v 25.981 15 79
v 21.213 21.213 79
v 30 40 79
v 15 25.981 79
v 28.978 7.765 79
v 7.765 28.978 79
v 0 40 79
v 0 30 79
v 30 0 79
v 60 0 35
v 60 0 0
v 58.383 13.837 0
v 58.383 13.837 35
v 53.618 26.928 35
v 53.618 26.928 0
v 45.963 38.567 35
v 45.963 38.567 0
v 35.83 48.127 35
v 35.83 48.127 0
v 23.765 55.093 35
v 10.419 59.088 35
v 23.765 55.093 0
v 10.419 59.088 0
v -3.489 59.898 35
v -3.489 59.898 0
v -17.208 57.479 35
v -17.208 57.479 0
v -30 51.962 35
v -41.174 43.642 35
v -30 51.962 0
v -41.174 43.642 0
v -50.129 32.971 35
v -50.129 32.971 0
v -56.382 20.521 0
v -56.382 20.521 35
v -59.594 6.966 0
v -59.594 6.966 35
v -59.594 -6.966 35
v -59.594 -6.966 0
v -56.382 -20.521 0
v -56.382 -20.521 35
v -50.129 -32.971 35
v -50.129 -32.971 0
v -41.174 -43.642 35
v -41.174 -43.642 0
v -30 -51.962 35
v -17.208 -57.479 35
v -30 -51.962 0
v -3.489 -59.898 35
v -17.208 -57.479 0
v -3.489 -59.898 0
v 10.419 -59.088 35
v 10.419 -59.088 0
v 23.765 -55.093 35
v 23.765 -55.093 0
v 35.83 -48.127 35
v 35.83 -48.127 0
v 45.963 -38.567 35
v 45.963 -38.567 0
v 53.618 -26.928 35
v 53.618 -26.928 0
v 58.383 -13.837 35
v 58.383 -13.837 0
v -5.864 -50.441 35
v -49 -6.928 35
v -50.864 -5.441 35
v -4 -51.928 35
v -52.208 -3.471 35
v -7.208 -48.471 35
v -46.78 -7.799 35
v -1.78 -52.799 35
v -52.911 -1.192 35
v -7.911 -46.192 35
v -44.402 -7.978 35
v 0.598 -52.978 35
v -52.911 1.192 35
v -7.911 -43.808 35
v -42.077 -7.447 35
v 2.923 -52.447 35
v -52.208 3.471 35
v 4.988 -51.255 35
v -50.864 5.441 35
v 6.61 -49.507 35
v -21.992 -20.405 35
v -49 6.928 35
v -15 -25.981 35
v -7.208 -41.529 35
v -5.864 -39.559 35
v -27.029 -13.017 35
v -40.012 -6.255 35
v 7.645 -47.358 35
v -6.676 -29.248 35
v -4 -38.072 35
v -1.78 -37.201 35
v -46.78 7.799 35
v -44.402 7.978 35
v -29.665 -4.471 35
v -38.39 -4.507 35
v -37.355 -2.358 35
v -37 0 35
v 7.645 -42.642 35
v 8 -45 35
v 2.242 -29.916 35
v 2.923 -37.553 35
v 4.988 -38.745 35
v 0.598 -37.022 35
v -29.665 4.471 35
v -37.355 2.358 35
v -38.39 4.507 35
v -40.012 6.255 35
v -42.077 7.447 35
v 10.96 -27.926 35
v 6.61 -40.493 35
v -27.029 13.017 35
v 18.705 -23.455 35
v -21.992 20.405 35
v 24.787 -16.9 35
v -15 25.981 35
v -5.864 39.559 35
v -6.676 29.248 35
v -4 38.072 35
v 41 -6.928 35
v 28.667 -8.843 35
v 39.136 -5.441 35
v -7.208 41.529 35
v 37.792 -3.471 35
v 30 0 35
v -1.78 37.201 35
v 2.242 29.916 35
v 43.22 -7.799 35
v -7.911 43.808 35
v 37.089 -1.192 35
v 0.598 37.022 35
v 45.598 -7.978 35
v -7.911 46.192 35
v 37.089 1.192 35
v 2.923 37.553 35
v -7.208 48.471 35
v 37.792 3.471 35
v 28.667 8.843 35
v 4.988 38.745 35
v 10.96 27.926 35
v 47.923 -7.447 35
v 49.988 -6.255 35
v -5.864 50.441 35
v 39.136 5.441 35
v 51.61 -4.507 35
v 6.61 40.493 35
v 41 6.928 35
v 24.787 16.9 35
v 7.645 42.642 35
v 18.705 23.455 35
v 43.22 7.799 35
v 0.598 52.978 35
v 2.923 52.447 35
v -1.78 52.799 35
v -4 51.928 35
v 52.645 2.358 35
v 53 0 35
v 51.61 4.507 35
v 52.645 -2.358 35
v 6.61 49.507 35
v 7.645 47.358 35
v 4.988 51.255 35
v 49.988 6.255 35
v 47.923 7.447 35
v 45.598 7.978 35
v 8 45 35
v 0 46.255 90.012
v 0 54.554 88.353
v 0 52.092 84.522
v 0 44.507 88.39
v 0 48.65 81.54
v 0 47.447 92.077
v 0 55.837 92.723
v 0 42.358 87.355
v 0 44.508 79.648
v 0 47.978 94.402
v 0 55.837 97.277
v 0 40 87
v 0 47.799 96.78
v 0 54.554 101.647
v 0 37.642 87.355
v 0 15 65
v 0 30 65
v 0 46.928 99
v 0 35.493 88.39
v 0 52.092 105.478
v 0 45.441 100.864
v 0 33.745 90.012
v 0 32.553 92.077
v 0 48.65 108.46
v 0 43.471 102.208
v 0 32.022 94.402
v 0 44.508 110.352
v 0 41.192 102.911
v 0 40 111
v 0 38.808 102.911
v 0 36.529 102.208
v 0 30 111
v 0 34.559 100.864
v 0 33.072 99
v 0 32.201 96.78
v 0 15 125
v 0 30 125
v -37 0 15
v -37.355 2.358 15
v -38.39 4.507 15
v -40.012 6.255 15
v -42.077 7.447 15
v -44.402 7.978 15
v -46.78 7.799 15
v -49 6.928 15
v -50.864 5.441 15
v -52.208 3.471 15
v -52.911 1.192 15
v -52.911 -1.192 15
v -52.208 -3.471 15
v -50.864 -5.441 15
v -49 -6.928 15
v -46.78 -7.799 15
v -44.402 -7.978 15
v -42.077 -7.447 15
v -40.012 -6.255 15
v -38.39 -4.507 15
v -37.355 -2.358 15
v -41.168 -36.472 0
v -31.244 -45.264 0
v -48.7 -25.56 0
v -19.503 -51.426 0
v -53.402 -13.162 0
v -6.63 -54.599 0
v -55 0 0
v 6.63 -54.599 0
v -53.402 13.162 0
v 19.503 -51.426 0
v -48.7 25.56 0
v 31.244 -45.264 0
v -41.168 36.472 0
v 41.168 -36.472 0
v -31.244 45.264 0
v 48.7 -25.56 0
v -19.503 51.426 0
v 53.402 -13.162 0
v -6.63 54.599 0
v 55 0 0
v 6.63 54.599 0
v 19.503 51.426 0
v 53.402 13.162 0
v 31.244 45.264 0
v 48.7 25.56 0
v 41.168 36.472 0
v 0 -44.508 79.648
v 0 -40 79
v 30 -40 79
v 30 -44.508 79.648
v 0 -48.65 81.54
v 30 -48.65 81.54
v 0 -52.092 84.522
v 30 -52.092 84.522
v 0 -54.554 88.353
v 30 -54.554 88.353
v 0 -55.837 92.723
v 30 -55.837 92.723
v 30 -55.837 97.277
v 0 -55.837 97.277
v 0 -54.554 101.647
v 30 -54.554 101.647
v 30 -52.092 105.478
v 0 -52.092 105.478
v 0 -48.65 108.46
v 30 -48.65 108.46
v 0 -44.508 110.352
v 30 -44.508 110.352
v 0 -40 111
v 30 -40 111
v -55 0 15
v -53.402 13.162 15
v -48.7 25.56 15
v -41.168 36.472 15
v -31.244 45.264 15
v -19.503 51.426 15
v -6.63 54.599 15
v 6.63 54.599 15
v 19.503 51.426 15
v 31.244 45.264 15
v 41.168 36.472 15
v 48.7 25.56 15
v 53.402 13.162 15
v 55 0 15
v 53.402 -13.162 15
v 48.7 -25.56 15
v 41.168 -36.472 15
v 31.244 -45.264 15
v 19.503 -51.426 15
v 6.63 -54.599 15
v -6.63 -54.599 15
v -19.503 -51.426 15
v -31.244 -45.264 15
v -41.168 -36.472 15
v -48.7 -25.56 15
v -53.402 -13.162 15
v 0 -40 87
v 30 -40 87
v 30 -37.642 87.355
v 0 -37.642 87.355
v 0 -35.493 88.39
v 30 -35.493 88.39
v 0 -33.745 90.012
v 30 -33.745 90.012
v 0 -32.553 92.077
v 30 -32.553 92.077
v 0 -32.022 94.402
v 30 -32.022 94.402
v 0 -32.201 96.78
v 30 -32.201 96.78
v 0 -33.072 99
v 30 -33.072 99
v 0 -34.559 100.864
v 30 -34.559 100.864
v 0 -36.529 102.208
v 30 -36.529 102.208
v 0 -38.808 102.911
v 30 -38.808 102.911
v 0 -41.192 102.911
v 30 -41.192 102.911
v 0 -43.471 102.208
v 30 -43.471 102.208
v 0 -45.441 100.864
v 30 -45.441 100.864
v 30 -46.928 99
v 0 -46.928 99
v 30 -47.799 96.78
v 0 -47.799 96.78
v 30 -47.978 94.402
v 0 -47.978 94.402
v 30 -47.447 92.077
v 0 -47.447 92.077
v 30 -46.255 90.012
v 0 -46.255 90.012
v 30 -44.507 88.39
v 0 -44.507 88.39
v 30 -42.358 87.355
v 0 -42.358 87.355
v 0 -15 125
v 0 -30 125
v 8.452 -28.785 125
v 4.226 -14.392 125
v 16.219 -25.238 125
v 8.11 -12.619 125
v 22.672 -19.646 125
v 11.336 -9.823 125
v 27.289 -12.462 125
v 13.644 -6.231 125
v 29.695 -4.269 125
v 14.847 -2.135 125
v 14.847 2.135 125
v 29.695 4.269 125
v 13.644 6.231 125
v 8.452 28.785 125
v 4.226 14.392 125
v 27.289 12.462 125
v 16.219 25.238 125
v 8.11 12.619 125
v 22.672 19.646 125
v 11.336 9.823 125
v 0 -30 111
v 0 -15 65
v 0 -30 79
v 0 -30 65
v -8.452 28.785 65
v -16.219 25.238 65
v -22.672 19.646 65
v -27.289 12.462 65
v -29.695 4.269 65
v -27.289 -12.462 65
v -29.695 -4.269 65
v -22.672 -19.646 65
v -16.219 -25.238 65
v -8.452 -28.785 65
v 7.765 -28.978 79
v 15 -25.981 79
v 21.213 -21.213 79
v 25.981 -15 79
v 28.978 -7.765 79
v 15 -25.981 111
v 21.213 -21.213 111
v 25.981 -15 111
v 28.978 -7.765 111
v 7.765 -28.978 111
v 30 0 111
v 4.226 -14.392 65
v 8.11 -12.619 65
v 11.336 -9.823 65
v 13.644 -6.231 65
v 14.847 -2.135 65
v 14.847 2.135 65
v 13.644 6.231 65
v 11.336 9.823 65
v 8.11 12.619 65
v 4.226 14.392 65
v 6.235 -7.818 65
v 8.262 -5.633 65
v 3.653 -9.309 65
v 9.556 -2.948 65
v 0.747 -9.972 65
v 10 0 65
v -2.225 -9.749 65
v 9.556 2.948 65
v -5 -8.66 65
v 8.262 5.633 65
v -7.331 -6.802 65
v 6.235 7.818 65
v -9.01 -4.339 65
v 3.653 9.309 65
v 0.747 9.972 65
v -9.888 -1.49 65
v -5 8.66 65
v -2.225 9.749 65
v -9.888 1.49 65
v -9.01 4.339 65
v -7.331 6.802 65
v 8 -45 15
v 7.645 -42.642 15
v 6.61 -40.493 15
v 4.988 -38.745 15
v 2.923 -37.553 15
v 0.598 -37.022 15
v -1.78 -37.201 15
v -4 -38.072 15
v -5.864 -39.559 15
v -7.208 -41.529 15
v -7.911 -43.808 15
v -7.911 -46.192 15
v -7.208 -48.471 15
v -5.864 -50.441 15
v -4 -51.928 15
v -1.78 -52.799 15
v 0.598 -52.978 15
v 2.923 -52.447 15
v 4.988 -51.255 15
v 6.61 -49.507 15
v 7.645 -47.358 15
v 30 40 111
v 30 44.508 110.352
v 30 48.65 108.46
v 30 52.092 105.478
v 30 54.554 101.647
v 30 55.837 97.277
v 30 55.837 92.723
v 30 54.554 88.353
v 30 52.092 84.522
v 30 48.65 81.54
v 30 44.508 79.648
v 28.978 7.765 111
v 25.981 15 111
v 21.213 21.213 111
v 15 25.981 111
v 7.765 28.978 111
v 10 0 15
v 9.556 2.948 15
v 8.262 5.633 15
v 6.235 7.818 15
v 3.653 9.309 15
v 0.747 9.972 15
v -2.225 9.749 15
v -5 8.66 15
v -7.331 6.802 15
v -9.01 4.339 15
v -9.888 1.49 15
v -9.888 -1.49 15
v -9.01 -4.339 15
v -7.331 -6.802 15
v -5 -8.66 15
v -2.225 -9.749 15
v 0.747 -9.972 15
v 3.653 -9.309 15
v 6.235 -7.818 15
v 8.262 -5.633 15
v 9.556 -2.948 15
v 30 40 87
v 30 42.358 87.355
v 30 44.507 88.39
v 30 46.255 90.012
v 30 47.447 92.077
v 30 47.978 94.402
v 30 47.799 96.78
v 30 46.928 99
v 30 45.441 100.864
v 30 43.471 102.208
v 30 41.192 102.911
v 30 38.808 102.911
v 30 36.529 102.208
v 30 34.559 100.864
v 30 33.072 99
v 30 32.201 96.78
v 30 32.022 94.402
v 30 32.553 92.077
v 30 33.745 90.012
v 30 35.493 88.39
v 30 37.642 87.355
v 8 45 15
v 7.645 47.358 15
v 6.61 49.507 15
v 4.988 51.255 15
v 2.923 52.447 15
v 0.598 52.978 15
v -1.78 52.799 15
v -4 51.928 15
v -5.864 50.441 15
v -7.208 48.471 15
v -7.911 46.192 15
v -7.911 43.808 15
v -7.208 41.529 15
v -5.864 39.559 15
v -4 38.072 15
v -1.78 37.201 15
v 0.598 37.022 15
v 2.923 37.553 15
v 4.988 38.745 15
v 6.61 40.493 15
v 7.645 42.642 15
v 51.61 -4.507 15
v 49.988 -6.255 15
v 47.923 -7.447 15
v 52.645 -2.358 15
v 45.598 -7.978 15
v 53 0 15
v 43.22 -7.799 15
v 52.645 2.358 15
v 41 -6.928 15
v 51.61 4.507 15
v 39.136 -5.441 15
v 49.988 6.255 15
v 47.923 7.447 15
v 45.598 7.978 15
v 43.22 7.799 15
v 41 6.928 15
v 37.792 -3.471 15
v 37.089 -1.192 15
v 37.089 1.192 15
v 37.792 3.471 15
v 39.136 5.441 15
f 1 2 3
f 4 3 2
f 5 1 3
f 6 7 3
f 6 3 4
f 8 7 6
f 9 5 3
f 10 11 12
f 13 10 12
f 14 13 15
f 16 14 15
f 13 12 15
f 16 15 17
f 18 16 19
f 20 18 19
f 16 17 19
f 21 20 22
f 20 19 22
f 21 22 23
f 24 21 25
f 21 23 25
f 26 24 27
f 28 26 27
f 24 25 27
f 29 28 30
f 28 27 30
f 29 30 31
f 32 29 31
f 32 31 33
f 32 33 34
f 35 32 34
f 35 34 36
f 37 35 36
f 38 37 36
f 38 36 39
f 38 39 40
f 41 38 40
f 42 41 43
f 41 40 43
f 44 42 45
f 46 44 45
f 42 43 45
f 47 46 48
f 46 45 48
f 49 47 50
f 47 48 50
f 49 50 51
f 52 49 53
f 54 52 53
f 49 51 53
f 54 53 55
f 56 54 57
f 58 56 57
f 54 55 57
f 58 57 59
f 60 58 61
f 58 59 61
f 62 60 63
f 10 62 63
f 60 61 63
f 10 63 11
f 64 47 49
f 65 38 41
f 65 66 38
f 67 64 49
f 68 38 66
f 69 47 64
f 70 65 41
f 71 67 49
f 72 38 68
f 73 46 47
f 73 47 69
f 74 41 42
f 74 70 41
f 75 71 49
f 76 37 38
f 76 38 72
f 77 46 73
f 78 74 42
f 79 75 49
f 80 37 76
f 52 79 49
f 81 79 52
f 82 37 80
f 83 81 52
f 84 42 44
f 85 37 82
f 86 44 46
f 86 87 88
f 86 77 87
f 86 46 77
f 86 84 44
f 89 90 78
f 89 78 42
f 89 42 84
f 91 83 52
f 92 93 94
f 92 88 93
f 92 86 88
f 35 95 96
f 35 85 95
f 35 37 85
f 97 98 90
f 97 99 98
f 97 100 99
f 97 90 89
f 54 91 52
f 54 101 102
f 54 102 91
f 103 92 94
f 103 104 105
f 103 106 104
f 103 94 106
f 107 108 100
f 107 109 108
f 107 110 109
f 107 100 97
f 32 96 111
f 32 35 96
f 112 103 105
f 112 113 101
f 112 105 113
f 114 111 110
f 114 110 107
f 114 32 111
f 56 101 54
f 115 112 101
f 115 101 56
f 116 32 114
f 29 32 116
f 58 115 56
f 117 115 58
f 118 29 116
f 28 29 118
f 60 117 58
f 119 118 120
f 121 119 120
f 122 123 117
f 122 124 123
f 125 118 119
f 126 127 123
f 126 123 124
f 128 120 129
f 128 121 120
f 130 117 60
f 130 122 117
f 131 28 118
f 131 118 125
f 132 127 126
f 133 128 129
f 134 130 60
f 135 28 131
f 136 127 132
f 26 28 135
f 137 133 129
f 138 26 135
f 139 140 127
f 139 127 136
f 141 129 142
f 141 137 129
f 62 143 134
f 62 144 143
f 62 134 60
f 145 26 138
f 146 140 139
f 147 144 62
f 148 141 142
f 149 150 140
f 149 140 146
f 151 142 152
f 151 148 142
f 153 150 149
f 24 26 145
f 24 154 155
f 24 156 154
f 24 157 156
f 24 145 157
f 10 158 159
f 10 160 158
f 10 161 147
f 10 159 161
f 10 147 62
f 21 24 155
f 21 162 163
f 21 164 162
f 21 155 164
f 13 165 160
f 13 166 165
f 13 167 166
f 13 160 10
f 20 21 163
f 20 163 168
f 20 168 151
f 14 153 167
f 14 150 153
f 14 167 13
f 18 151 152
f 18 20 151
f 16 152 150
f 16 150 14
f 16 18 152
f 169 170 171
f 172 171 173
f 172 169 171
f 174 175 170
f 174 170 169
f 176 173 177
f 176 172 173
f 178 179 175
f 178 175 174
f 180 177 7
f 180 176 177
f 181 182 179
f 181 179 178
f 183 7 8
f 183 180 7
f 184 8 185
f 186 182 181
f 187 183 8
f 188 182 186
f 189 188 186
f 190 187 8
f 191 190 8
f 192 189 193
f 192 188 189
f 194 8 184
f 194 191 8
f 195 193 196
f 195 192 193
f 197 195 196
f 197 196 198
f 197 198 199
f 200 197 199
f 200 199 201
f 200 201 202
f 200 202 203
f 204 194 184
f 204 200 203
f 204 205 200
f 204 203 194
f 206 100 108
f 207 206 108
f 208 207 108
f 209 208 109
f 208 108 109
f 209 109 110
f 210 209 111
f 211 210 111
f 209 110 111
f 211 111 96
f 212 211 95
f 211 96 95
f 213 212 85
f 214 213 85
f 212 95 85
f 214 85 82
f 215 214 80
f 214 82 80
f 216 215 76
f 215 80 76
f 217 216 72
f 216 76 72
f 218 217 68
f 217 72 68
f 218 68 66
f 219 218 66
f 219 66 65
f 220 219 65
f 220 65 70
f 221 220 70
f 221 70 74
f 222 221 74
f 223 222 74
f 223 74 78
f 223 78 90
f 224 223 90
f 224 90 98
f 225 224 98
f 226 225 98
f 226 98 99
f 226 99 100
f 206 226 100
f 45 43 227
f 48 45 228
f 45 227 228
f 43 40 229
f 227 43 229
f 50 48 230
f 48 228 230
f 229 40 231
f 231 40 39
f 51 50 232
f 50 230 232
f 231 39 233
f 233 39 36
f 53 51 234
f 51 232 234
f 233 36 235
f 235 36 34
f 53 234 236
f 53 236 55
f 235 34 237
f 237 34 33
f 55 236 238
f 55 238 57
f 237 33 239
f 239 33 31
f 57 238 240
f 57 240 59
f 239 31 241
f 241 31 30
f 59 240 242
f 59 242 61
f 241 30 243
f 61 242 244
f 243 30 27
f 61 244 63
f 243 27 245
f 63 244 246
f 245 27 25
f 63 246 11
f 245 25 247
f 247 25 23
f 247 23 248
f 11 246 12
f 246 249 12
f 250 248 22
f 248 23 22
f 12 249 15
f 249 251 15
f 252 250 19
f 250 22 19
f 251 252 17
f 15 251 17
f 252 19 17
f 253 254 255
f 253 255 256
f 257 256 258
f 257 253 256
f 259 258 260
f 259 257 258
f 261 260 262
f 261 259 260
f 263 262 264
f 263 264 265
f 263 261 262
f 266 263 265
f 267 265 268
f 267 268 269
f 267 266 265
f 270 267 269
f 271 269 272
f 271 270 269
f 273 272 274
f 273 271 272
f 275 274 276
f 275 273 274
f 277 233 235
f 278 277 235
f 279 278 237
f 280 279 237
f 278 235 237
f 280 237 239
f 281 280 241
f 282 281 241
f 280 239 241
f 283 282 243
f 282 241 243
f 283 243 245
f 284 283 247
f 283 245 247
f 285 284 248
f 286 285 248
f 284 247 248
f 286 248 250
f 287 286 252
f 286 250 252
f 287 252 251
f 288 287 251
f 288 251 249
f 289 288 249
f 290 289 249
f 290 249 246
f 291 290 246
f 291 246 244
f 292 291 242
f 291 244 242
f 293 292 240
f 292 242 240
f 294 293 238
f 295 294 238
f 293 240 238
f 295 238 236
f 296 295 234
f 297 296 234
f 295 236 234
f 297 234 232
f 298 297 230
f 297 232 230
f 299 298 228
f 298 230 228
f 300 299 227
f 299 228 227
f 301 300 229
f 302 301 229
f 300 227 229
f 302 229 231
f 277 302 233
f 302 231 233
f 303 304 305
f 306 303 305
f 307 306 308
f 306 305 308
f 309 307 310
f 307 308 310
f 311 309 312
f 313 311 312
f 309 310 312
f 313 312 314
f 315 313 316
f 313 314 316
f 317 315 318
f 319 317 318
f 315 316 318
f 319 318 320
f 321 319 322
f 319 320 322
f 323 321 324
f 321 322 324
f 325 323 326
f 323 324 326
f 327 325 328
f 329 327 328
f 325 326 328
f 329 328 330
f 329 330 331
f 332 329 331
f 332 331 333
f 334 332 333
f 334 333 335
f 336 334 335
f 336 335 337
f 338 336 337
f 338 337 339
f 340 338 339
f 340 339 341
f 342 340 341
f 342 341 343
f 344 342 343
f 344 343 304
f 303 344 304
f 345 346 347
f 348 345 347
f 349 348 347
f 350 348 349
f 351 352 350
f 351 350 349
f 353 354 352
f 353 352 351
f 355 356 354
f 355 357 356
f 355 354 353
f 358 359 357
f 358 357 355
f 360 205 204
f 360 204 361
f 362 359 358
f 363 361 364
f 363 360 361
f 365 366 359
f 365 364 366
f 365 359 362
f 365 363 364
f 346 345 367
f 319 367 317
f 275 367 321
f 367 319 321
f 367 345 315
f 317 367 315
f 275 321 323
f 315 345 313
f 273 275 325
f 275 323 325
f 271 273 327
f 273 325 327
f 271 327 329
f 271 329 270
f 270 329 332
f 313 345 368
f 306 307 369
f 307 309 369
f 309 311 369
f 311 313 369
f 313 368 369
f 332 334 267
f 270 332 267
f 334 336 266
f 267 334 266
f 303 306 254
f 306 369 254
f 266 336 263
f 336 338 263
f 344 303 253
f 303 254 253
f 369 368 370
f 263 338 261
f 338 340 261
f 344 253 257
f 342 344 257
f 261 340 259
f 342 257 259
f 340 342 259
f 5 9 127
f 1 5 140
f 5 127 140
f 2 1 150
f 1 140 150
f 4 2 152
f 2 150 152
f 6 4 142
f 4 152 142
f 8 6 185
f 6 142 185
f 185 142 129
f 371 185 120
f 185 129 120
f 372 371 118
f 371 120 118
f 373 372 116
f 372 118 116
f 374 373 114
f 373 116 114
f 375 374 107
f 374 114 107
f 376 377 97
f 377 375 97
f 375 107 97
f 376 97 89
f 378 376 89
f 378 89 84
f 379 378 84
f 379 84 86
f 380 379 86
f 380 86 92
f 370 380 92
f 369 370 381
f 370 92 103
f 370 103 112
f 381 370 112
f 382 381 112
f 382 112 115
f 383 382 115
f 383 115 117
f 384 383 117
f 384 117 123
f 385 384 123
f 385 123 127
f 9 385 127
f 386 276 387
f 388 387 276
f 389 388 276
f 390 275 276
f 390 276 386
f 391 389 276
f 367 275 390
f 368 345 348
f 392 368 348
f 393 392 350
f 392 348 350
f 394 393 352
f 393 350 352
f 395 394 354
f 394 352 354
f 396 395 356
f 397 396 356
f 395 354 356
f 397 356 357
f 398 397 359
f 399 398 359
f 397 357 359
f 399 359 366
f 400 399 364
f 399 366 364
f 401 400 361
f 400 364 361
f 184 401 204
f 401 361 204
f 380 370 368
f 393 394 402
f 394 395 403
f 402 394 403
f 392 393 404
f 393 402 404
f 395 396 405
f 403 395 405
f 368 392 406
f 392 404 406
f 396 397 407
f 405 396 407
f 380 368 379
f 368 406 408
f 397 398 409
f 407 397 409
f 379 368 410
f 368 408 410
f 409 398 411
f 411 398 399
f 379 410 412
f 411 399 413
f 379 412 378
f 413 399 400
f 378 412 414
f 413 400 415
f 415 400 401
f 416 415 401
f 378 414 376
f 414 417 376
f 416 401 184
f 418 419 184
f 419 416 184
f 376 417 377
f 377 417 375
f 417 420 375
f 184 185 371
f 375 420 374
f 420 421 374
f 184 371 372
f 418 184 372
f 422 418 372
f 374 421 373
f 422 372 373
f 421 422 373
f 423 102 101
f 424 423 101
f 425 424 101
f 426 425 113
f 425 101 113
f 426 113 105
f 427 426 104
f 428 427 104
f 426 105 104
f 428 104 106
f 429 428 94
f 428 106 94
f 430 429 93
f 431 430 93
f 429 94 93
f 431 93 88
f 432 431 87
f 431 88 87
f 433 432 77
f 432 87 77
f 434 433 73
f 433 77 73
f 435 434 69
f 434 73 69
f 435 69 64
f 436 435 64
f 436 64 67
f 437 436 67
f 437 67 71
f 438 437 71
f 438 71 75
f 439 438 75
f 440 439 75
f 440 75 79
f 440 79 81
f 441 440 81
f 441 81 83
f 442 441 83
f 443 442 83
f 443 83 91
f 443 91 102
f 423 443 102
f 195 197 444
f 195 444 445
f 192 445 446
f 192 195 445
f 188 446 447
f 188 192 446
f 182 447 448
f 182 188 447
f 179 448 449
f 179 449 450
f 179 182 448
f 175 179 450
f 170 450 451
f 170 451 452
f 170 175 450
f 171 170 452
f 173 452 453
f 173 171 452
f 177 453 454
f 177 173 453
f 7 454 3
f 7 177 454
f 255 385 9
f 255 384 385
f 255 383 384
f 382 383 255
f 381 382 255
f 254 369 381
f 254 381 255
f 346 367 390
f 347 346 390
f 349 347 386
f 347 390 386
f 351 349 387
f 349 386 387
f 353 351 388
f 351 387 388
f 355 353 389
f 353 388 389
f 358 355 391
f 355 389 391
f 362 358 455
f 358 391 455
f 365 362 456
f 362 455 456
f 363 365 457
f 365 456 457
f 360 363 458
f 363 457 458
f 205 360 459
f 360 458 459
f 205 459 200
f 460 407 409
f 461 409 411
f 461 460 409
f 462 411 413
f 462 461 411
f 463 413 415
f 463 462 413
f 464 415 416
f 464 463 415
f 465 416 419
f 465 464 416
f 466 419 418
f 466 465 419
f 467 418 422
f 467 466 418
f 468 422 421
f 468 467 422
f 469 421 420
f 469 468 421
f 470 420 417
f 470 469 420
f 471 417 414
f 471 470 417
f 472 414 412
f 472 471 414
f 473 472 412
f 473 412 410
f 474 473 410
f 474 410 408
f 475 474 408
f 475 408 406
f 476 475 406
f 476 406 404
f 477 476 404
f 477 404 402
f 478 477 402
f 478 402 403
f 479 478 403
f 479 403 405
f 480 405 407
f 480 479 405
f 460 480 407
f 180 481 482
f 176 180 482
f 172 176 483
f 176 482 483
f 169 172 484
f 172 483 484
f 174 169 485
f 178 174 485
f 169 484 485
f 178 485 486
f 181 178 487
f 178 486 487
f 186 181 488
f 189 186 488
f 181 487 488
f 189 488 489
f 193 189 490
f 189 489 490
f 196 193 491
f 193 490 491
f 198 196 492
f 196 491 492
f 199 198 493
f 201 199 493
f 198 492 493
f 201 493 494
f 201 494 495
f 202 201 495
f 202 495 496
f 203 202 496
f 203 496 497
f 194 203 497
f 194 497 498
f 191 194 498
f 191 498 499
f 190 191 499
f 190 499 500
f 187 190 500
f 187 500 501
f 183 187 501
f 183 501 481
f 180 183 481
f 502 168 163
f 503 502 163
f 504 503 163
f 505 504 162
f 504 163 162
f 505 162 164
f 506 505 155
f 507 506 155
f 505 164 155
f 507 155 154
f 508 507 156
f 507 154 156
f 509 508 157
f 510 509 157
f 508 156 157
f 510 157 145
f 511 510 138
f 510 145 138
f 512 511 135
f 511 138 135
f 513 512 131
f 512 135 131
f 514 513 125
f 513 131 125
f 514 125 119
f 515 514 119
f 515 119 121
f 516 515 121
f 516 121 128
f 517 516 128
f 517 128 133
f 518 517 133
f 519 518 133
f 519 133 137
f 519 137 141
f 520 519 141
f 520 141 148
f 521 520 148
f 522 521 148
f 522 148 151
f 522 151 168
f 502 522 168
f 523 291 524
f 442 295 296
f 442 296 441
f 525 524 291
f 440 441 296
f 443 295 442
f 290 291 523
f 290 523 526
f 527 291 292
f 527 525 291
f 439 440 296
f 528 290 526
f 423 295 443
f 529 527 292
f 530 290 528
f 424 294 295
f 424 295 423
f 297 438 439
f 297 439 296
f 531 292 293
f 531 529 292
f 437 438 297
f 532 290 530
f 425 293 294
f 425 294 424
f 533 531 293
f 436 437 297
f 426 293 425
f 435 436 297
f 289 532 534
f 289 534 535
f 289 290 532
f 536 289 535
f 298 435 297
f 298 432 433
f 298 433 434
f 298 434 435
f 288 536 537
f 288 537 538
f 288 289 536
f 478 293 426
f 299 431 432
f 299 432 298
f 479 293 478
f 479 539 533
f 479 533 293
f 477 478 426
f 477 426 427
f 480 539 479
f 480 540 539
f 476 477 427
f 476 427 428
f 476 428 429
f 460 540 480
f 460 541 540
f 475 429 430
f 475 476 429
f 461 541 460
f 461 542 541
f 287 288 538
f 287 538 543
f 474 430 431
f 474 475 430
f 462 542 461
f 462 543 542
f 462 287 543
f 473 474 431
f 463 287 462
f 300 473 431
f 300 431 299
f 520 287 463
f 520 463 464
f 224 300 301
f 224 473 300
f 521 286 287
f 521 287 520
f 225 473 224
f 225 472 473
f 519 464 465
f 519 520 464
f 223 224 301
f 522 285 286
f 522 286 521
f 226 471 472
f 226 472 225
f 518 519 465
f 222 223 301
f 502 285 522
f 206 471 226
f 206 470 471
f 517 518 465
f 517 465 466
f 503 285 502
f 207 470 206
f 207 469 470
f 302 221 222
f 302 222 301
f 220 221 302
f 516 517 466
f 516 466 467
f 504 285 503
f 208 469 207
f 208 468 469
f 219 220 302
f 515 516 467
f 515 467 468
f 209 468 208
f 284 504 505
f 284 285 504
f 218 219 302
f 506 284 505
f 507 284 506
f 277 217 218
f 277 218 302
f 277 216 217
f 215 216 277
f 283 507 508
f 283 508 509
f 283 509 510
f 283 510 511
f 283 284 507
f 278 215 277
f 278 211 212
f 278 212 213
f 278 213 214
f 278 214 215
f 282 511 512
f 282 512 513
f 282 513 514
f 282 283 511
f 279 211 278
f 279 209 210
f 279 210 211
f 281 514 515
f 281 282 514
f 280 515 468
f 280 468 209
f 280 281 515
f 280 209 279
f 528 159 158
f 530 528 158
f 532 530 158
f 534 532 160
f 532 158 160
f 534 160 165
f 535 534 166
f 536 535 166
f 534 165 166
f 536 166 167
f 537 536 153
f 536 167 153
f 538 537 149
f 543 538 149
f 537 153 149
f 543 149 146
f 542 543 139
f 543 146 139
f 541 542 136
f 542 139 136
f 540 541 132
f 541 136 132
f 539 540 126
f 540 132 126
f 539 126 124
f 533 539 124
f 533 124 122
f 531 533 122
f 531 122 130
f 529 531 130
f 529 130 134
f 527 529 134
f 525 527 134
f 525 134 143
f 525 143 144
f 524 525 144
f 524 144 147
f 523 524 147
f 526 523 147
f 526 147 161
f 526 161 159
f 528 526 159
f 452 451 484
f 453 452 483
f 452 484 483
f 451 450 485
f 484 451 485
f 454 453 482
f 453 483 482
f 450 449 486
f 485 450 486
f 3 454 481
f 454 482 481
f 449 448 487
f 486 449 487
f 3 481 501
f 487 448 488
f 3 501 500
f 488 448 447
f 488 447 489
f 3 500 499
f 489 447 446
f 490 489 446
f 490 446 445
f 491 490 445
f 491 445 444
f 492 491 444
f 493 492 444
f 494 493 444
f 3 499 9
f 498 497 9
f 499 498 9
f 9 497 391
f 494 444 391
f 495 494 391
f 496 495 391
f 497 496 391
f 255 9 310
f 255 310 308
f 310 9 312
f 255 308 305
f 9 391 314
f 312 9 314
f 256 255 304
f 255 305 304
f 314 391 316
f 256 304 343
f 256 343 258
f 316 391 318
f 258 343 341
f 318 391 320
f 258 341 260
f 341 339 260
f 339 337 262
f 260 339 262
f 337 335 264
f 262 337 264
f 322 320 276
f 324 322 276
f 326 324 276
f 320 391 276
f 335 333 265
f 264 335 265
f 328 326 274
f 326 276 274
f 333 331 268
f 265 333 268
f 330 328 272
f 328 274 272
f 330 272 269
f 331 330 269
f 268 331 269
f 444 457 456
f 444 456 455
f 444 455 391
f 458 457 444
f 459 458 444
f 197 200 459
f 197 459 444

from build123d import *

# Parameters (mm, degrees)
SKETCH1_R               = 60
SKETCH1_R_2             = 30
BOSS_EXTRUDE1_DEPTH     = 35
SKETCH1_3_R             = 30
BOSS_EXTRUDE2_DEPTH     = 125
BOSS_EXTRUDE3_DEPTH     = 30
CUT_EXTRUDE2_DEPTH      = 152.079449297
CUT_EXTRUDE2_DEPTH_BACK = 152.079449297
SKETCH5_R               = 10
CUT_EXTRUDE3_DEPTH      = 152.079449297
CUT_EXTRUDE3_DEPTH_BACK = 60
CUT_EXTRUDE4_DEPTH      = 60
SKETCH9_R               = 8
CUT_EXTRUDE5_DEPTH      = 166.302752548
SKETCH10_R              = 8
CUT_EXTRUDE6_DEPTH      = 124.693168769
SKETCH11_R              = 55
CUT_EXTRUDE7_DEPTH      = 15


with BuildPart() as part:
    # Sketch1 → Boss-Extrude1 (new body)
    # profile 1 of 2: a face of its own
    with BuildSketch(Plane(origin=(0, 0, 0), x_dir=(0, 1, 0), z_dir=(0, 0, 1))):
        with Locations(Location((0, 0, 0), (0, 0, 270))):
            Circle(SKETCH1_R)
        Circle(SKETCH1_R_2, mode=Mode.SUBTRACT)
    # profile 2 of 2: a face of its own
    with BuildSketch(Plane(origin=(0, 0, 0), x_dir=(0, 1, 0), z_dir=(0, 0, 1))):
        Circle(SKETCH1_R_2)
    extrude(amount=BOSS_EXTRUDE1_DEPTH)

    # Sketch1<3> → Boss-Extrude2 (add)
    with BuildSketch(Plane(origin=(0, 0, 0), x_dir=(0, 1, 0), z_dir=(0, 0, 1))):
        with Locations(Location((0, 0, 0), (0, 0, 270))):
            Circle(SKETCH1_3_R)
    extrude(amount=BOSS_EXTRUDE2_DEPTH)

    # Sketch4 → Boss-Extrude3 (add)
    with BuildSketch(Plane.YZ):
        with BuildLine():
            Line((40, 79), (-40, 79))
            ThreePointArc((-40, 79), (-56, 95), (-40, 111))
            Line((-40, 111), (40, 111))
            ThreePointArc((40, 111), (56, 95), (40, 79))
        make_face()
    extrude(amount=BOSS_EXTRUDE3_DEPTH)

    # Sketch5 → Cut-Extrude2 (cut, two sides: drawn at the far end of the back side and taken through both)
    with BuildSketch(Plane.XY.offset(125).offset(-CUT_EXTRUDE2_DEPTH_BACK)):
        Circle(SKETCH5_R)
    extrude(amount=CUT_EXTRUDE2_DEPTH + CUT_EXTRUDE2_DEPTH_BACK, mode=Mode.SUBTRACT)

    # Sketch7 → Cut-Extrude3 (cut, two sides: drawn at the far end of the back side and taken through both)
    with BuildSketch(Plane.XY.offset(125).offset(-CUT_EXTRUDE3_DEPTH_BACK)):
        with BuildLine():
            Line((0, 30), (0, -30))
            ThreePointArc((0, -30), (-30, 0), (0, 30))
        make_face()
    extrude(amount=CUT_EXTRUDE3_DEPTH + CUT_EXTRUDE3_DEPTH_BACK, mode=Mode.SUBTRACT)

    # Sketch8 → Cut-Extrude4 (cut)
    with BuildSketch(Plane.XY.offset(125)):
        with BuildLine():
            Line((0, 15), (0, 10))
            ThreePointArc((0, 10), (10, 0), (0, -10))
            Line((0, -10), (0, -15))
            ThreePointArc((0, -15), (15, 0), (0, 15))
        make_face()
    extrude(amount=-CUT_EXTRUDE4_DEPTH, mode=Mode.SUBTRACT)

    # Sketch9 → Cut-Extrude5 (cut, through all)
    with BuildSketch(Plane.YZ.offset(30)):
        with Locations(Location((-40, 95, 0), (0, 0, 270))):
            Circle(SKETCH9_R)
        with Locations(Location((40, 95, 0), (0, 0, 270))):
            Circle(SKETCH9_R)
    extrude(amount=-CUT_EXTRUDE5_DEPTH, mode=Mode.SUBTRACT)

    # Sketch10 → Cut-Extrude6 (cut, through all)
    with BuildSketch(Plane.XY.offset(35)):
        with Locations((-45, 0)):
            Circle(SKETCH10_R)
        with Locations((0, 45)):
            Circle(SKETCH10_R)
        with Locations((45, 0)):
            Circle(SKETCH10_R)
        with Locations((0, -45)):
            Circle(SKETCH10_R)
    extrude(amount=-CUT_EXTRUDE6_DEPTH, mode=Mode.SUBTRACT)

    # Sketch11 → Cut-Extrude7 (cut)
    with BuildSketch(Plane(origin=(0, 0, 0), x_dir=(1, 0, 0), z_dir=(0, 0, -1))):
        with Locations(Location((0, 0, 0), (0, 0, 180))):
            Circle(SKETCH11_R)
    extrude(amount=-CUT_EXTRUDE7_DEPTH, mode=Mode.SUBTRACT)


solid = part.part
